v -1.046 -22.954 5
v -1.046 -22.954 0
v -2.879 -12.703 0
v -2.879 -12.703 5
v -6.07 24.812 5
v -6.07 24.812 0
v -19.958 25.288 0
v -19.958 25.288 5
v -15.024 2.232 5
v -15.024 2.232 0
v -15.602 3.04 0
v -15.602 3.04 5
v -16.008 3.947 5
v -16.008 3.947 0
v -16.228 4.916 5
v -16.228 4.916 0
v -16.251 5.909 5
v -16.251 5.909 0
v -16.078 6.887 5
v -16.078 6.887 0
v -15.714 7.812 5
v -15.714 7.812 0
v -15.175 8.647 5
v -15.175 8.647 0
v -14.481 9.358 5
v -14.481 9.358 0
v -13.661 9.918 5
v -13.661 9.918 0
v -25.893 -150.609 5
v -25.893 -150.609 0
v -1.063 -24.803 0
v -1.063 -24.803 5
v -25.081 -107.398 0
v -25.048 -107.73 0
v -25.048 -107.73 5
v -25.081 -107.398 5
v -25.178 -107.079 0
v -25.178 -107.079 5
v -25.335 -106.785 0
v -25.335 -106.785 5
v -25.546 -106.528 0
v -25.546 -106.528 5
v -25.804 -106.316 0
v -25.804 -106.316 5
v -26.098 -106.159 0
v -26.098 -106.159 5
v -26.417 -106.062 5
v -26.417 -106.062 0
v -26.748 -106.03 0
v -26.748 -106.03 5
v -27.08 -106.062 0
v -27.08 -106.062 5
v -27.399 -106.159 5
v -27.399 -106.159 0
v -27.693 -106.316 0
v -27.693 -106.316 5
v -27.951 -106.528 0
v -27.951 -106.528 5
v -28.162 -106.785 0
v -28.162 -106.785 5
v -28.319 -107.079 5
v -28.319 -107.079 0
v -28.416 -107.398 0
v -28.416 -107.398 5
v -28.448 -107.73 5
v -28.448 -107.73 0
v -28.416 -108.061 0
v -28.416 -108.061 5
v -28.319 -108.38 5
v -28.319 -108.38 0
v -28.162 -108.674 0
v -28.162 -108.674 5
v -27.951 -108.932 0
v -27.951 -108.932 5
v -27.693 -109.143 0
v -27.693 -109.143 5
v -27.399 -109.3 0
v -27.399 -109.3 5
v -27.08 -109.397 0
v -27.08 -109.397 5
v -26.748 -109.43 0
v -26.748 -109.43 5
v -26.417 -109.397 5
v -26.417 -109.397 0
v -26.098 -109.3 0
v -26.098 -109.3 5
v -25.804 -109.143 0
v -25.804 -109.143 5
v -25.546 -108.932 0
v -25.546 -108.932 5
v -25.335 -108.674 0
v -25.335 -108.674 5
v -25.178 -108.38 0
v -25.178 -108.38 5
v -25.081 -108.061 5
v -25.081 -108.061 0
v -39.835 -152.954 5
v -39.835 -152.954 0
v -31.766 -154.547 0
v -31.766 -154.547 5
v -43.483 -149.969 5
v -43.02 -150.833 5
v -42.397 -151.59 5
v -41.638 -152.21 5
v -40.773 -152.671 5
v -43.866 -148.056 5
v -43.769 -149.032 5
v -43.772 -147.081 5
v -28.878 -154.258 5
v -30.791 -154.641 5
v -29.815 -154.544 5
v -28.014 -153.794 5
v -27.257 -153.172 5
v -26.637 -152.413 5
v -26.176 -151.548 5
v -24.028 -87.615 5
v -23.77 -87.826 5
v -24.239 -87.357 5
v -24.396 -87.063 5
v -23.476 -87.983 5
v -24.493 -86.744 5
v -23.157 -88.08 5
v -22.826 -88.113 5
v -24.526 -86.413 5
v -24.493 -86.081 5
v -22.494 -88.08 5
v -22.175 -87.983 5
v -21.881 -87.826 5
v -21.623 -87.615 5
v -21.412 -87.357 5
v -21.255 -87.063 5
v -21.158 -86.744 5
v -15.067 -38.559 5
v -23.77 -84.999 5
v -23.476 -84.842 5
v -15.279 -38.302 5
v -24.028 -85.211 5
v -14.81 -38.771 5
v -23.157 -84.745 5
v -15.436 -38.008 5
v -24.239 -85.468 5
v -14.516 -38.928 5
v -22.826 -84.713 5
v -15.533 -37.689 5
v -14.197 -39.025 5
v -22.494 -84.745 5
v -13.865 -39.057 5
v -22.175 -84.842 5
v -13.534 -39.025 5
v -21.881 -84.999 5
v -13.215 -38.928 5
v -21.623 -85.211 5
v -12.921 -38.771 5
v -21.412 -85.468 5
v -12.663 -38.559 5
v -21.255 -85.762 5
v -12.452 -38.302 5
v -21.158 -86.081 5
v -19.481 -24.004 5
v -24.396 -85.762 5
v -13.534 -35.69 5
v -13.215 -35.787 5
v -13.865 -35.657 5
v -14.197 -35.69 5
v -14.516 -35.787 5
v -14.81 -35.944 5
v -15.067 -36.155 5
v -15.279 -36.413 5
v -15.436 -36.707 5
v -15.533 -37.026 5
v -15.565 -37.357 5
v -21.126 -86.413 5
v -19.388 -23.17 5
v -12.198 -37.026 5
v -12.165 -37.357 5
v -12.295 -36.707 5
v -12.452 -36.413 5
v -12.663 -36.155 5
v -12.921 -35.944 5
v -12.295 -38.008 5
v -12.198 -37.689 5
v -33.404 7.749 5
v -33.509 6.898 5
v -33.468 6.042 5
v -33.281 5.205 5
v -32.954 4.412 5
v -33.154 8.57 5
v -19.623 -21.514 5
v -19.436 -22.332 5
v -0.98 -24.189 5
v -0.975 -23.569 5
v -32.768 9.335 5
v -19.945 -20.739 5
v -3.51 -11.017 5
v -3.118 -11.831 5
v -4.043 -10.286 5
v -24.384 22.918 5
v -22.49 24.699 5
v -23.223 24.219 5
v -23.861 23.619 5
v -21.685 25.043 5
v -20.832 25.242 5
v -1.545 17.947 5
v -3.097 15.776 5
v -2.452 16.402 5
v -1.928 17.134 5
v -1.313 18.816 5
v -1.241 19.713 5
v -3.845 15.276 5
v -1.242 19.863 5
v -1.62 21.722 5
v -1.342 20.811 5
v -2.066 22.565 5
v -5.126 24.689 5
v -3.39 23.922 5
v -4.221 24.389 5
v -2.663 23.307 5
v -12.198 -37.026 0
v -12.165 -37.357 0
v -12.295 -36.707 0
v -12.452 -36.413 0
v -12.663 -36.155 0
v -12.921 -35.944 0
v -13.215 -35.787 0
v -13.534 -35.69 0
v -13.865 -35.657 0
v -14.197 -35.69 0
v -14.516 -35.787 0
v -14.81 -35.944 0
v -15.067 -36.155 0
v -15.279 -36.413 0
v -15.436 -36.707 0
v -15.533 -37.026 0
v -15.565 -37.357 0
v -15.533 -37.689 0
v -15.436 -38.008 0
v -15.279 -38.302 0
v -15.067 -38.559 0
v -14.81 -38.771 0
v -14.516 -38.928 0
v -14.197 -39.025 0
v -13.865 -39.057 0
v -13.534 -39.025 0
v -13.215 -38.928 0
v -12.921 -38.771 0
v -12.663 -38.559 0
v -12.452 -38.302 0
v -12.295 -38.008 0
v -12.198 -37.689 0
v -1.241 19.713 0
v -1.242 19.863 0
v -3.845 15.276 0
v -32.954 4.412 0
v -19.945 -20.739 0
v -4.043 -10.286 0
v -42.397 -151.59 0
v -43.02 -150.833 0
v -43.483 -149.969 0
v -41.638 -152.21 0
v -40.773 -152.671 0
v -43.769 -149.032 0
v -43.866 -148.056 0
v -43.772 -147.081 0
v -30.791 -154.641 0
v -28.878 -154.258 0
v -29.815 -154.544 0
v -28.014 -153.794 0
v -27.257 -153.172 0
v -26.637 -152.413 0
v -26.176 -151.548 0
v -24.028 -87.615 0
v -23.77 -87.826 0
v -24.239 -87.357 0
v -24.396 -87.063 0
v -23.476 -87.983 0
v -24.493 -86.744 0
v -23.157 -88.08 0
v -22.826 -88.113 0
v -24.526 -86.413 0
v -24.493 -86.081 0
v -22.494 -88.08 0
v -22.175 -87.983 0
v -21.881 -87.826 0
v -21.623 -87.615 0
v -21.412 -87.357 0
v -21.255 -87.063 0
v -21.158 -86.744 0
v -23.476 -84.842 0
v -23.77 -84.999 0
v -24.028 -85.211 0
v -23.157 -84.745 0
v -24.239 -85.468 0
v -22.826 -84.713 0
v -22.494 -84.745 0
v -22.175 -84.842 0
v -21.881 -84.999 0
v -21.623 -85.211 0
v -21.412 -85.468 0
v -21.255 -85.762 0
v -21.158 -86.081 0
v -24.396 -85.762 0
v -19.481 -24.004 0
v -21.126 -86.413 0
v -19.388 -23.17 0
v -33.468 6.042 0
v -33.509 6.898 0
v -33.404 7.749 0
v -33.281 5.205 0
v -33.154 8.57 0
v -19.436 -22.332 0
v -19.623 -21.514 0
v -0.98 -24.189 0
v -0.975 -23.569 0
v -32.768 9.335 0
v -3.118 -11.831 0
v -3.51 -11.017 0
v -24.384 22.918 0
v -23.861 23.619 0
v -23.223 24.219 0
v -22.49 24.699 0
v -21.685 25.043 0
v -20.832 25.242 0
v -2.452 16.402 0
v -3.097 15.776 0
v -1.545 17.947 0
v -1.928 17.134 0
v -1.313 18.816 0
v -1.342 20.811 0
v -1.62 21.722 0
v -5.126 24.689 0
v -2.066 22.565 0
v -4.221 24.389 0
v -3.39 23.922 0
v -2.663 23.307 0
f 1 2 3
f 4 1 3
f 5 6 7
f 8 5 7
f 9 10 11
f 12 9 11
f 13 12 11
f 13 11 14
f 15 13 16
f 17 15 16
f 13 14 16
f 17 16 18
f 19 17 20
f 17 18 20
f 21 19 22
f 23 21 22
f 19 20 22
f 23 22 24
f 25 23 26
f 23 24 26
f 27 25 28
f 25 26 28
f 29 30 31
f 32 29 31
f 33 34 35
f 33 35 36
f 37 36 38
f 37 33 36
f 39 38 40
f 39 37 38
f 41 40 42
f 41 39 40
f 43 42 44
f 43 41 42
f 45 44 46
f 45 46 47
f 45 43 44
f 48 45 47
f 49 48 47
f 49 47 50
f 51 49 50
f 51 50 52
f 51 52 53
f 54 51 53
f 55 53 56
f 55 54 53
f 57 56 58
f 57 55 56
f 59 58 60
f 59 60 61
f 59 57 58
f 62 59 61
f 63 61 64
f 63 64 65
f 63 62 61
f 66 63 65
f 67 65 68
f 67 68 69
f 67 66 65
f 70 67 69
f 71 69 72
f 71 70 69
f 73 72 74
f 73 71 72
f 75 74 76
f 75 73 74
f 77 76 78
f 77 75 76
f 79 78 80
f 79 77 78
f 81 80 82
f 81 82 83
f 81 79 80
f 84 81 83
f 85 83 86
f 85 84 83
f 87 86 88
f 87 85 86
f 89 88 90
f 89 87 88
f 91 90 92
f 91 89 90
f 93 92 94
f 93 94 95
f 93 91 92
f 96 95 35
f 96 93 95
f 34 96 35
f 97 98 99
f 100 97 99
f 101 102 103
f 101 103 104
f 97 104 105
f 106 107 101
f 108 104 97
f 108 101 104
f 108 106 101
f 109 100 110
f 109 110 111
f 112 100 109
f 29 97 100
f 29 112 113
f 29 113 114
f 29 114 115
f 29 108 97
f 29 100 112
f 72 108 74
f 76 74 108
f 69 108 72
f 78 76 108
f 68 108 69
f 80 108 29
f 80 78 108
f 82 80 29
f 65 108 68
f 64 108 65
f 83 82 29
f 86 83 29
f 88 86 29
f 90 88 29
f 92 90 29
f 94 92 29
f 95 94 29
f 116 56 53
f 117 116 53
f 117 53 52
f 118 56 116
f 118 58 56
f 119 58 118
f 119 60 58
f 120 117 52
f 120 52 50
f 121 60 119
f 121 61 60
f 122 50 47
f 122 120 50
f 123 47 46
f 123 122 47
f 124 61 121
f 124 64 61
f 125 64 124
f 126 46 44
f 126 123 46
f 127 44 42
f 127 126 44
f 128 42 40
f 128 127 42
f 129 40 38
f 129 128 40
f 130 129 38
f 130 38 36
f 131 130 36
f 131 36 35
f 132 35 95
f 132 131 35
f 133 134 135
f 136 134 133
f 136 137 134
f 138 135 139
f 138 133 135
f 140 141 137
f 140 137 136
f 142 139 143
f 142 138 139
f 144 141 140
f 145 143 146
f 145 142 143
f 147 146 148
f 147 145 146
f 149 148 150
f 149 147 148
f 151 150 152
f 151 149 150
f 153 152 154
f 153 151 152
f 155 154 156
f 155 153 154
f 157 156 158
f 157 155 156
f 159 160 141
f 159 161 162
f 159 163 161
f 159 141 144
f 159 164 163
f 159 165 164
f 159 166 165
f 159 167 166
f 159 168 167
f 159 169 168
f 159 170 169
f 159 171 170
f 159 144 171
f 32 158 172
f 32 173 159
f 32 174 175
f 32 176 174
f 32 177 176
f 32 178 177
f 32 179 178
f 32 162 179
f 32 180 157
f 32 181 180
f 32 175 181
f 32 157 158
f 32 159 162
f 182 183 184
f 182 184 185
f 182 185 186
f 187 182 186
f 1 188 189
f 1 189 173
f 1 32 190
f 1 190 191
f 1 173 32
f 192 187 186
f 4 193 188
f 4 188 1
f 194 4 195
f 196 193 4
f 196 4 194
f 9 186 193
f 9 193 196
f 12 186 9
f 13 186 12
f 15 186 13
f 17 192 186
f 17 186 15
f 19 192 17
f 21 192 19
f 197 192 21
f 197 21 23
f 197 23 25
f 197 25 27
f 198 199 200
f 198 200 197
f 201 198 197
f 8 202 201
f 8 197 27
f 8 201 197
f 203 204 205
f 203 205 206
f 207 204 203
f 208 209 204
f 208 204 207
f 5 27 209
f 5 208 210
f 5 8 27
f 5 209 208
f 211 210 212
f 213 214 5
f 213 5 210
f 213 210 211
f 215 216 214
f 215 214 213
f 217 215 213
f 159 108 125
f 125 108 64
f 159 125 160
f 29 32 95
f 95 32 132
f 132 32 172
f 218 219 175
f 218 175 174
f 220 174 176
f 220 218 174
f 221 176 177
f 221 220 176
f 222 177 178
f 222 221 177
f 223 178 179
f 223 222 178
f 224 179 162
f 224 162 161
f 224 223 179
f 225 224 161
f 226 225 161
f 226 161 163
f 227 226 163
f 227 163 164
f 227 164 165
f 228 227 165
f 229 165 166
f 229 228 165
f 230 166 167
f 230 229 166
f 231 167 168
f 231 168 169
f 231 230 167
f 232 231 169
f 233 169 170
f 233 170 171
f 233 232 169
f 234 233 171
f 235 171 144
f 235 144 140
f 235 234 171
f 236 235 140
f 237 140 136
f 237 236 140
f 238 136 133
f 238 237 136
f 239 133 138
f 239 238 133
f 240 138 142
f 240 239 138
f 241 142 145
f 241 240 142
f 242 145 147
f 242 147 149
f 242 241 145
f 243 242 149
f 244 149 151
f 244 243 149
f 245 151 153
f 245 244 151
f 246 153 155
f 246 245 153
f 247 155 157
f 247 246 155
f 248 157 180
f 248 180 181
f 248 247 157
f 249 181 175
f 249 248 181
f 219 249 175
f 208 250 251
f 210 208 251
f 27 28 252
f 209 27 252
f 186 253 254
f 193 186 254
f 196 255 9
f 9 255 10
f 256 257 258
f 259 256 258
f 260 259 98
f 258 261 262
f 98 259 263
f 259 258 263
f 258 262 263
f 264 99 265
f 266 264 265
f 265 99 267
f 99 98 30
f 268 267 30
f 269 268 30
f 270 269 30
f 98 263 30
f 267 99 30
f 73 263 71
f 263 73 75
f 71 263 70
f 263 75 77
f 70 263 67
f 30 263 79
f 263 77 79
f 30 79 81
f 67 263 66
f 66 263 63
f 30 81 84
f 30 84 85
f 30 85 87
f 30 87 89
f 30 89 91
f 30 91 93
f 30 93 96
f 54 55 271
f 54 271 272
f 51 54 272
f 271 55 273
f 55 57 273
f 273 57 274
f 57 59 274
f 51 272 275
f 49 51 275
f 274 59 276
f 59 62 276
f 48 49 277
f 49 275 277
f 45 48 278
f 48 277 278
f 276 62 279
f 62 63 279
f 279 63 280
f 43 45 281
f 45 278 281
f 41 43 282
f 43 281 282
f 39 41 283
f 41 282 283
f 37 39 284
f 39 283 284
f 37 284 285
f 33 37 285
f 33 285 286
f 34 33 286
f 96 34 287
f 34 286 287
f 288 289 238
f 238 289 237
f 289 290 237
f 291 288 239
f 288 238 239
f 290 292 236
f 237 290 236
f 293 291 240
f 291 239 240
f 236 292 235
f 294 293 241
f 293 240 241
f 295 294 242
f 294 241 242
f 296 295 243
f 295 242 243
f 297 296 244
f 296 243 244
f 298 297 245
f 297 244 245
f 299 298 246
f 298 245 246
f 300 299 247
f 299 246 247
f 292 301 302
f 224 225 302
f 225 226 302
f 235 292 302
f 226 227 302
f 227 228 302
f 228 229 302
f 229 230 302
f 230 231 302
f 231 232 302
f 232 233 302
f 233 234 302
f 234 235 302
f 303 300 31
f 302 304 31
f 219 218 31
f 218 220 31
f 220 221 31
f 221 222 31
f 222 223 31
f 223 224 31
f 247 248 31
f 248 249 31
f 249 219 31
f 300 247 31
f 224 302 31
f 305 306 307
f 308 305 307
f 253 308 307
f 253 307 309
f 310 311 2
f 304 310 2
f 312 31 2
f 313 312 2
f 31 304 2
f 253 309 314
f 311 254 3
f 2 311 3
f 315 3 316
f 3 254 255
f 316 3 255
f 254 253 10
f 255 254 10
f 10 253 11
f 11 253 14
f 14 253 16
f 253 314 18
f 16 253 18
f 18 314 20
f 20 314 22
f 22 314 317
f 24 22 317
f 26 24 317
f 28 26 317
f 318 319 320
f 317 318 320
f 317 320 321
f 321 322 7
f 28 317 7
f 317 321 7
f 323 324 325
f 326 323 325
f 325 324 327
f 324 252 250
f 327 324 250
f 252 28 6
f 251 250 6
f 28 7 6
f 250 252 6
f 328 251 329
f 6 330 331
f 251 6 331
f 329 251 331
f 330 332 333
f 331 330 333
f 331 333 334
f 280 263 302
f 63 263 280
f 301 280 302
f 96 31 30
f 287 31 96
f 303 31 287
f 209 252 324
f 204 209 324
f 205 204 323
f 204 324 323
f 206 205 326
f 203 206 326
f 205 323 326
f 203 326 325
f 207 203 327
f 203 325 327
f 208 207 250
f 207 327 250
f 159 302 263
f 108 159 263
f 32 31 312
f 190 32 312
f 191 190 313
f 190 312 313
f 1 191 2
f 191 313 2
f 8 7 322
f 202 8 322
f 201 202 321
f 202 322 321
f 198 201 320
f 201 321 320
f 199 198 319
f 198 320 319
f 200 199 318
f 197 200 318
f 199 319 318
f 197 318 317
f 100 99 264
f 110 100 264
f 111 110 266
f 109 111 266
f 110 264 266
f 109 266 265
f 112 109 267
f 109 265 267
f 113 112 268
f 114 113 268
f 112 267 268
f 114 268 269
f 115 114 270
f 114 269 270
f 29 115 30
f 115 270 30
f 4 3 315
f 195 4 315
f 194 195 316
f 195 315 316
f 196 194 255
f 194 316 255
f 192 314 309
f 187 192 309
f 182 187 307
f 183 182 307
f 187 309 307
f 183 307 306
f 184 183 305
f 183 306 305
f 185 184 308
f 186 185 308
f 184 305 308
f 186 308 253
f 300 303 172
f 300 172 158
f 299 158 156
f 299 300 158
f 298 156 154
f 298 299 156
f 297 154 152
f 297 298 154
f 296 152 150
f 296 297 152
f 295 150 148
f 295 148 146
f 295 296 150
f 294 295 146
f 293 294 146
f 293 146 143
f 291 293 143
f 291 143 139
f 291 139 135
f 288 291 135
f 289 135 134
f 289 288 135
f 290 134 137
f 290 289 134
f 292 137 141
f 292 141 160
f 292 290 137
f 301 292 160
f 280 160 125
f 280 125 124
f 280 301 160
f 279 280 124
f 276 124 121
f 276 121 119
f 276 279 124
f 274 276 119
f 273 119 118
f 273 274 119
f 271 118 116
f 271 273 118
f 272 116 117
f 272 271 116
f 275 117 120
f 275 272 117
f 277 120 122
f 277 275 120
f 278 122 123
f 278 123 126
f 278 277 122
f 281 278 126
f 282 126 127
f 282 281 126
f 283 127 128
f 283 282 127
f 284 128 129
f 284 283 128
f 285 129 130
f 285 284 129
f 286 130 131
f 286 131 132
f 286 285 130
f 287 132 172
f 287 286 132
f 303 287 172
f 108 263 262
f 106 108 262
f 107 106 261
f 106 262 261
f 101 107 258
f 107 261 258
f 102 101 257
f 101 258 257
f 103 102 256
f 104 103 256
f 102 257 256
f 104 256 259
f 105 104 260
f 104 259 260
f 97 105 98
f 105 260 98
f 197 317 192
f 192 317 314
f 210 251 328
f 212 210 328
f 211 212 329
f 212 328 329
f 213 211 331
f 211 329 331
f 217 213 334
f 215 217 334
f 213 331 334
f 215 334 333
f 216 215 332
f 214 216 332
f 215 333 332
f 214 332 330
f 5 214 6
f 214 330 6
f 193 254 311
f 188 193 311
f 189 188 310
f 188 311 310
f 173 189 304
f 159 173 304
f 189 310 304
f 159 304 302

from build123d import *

# Parameters (mm, degrees)
SKETCH1_R           = 1.7
BOSS_EXTRUDE1_DEPTH = 5


with BuildPart() as part:
    # Sketch1 → Boss-Extrude1 (new body)
    with BuildSketch(Plane.XY):
        with BuildLine():
            Line((-6.070464182, 24.812225303), (-19.958071354, 25.288330369))
            ThreePointArc((-19.958071354, 25.288330369), (-22.490276705, 24.698780913), (-24.384131469, 22.917504226))
            Line((-24.384131469, 22.917504226), (-32.767669467, 9.335402505))
            ThreePointArc((-32.767669467, 9.335402505), (-33.509344938, 6.898271001), (-32.954010567, 4.412049729))
            Line((-32.954010567, 4.412049729), (-19.944783446, -20.739122704))
            ThreePointArc((-19.944783446, -20.739122704), (-19.435661169, -22.332379304), (-19.480501521, -24.004402458))
            Line((-19.480501521, -24.004402458), (-43.771872125, -147.080680186))
            ThreePointArc((-43.771872125, -147.080680186), (-43.019718624, -150.832869688), (-39.834667143, -152.954215487))
            Line((-39.834667143, -152.954215487), (-31.766323039, -154.546651824))
            ThreePointArc((-31.766323039, -154.546651824), (-28.014133538, -153.794498323), (-25.892787738, -150.609446842))
            Line((-25.892787738, -150.609446842), (-1.06250464, -24.802679145))
            ThreePointArc((-1.06250464, -24.802679145), (-0.968074634, -23.879218397), (-1.045977095, -22.954216783))
            Line((-1.045977095, -22.954216783), (-2.879406447, -12.703188307))
            ThreePointArc((-2.879406447, -12.703188307), (-3.295898049, -11.415233674), (-4.042598503, -10.286193895))
            Line((-4.042598503, -10.286193895), (-15.024159675, 2.232097065))
            ThreePointArc((-15.024159675, 2.232097065), (-16.188614474, 6.402596208), (-13.660892318, 9.918224001))
            Line((-13.660892318, 9.918224001), (-3.844891775, 15.275823833))
            ThreePointArc((-3.844891775, 15.275823833), (-1.928275453, 17.133614871), (-1.240561171, 19.712733856))
            Line((-1.240561171, 19.712733856), (-1.242008304, 19.86323568))
            ThreePointArc((-1.242008304, 19.86323568), (-2.662930088, 23.306844453), (-6.070464182, 24.812225303))
        make_face()
        with Locations((-13.865353247, -37.357391651)):
            Circle(SKETCH1_R, mode=Mode.SUBTRACT)
        with Locations((-26.748462507, -107.729710298)):
            Circle(SKETCH1_R, mode=Mode.SUBTRACT)
        with Locations((-22.825562759, -86.412593899)):
            Circle(SKETCH1_R, mode=Mode.SUBTRACT)
    extrude(amount=BOSS_EXTRUDE1_DEPTH)


solid = part.part
